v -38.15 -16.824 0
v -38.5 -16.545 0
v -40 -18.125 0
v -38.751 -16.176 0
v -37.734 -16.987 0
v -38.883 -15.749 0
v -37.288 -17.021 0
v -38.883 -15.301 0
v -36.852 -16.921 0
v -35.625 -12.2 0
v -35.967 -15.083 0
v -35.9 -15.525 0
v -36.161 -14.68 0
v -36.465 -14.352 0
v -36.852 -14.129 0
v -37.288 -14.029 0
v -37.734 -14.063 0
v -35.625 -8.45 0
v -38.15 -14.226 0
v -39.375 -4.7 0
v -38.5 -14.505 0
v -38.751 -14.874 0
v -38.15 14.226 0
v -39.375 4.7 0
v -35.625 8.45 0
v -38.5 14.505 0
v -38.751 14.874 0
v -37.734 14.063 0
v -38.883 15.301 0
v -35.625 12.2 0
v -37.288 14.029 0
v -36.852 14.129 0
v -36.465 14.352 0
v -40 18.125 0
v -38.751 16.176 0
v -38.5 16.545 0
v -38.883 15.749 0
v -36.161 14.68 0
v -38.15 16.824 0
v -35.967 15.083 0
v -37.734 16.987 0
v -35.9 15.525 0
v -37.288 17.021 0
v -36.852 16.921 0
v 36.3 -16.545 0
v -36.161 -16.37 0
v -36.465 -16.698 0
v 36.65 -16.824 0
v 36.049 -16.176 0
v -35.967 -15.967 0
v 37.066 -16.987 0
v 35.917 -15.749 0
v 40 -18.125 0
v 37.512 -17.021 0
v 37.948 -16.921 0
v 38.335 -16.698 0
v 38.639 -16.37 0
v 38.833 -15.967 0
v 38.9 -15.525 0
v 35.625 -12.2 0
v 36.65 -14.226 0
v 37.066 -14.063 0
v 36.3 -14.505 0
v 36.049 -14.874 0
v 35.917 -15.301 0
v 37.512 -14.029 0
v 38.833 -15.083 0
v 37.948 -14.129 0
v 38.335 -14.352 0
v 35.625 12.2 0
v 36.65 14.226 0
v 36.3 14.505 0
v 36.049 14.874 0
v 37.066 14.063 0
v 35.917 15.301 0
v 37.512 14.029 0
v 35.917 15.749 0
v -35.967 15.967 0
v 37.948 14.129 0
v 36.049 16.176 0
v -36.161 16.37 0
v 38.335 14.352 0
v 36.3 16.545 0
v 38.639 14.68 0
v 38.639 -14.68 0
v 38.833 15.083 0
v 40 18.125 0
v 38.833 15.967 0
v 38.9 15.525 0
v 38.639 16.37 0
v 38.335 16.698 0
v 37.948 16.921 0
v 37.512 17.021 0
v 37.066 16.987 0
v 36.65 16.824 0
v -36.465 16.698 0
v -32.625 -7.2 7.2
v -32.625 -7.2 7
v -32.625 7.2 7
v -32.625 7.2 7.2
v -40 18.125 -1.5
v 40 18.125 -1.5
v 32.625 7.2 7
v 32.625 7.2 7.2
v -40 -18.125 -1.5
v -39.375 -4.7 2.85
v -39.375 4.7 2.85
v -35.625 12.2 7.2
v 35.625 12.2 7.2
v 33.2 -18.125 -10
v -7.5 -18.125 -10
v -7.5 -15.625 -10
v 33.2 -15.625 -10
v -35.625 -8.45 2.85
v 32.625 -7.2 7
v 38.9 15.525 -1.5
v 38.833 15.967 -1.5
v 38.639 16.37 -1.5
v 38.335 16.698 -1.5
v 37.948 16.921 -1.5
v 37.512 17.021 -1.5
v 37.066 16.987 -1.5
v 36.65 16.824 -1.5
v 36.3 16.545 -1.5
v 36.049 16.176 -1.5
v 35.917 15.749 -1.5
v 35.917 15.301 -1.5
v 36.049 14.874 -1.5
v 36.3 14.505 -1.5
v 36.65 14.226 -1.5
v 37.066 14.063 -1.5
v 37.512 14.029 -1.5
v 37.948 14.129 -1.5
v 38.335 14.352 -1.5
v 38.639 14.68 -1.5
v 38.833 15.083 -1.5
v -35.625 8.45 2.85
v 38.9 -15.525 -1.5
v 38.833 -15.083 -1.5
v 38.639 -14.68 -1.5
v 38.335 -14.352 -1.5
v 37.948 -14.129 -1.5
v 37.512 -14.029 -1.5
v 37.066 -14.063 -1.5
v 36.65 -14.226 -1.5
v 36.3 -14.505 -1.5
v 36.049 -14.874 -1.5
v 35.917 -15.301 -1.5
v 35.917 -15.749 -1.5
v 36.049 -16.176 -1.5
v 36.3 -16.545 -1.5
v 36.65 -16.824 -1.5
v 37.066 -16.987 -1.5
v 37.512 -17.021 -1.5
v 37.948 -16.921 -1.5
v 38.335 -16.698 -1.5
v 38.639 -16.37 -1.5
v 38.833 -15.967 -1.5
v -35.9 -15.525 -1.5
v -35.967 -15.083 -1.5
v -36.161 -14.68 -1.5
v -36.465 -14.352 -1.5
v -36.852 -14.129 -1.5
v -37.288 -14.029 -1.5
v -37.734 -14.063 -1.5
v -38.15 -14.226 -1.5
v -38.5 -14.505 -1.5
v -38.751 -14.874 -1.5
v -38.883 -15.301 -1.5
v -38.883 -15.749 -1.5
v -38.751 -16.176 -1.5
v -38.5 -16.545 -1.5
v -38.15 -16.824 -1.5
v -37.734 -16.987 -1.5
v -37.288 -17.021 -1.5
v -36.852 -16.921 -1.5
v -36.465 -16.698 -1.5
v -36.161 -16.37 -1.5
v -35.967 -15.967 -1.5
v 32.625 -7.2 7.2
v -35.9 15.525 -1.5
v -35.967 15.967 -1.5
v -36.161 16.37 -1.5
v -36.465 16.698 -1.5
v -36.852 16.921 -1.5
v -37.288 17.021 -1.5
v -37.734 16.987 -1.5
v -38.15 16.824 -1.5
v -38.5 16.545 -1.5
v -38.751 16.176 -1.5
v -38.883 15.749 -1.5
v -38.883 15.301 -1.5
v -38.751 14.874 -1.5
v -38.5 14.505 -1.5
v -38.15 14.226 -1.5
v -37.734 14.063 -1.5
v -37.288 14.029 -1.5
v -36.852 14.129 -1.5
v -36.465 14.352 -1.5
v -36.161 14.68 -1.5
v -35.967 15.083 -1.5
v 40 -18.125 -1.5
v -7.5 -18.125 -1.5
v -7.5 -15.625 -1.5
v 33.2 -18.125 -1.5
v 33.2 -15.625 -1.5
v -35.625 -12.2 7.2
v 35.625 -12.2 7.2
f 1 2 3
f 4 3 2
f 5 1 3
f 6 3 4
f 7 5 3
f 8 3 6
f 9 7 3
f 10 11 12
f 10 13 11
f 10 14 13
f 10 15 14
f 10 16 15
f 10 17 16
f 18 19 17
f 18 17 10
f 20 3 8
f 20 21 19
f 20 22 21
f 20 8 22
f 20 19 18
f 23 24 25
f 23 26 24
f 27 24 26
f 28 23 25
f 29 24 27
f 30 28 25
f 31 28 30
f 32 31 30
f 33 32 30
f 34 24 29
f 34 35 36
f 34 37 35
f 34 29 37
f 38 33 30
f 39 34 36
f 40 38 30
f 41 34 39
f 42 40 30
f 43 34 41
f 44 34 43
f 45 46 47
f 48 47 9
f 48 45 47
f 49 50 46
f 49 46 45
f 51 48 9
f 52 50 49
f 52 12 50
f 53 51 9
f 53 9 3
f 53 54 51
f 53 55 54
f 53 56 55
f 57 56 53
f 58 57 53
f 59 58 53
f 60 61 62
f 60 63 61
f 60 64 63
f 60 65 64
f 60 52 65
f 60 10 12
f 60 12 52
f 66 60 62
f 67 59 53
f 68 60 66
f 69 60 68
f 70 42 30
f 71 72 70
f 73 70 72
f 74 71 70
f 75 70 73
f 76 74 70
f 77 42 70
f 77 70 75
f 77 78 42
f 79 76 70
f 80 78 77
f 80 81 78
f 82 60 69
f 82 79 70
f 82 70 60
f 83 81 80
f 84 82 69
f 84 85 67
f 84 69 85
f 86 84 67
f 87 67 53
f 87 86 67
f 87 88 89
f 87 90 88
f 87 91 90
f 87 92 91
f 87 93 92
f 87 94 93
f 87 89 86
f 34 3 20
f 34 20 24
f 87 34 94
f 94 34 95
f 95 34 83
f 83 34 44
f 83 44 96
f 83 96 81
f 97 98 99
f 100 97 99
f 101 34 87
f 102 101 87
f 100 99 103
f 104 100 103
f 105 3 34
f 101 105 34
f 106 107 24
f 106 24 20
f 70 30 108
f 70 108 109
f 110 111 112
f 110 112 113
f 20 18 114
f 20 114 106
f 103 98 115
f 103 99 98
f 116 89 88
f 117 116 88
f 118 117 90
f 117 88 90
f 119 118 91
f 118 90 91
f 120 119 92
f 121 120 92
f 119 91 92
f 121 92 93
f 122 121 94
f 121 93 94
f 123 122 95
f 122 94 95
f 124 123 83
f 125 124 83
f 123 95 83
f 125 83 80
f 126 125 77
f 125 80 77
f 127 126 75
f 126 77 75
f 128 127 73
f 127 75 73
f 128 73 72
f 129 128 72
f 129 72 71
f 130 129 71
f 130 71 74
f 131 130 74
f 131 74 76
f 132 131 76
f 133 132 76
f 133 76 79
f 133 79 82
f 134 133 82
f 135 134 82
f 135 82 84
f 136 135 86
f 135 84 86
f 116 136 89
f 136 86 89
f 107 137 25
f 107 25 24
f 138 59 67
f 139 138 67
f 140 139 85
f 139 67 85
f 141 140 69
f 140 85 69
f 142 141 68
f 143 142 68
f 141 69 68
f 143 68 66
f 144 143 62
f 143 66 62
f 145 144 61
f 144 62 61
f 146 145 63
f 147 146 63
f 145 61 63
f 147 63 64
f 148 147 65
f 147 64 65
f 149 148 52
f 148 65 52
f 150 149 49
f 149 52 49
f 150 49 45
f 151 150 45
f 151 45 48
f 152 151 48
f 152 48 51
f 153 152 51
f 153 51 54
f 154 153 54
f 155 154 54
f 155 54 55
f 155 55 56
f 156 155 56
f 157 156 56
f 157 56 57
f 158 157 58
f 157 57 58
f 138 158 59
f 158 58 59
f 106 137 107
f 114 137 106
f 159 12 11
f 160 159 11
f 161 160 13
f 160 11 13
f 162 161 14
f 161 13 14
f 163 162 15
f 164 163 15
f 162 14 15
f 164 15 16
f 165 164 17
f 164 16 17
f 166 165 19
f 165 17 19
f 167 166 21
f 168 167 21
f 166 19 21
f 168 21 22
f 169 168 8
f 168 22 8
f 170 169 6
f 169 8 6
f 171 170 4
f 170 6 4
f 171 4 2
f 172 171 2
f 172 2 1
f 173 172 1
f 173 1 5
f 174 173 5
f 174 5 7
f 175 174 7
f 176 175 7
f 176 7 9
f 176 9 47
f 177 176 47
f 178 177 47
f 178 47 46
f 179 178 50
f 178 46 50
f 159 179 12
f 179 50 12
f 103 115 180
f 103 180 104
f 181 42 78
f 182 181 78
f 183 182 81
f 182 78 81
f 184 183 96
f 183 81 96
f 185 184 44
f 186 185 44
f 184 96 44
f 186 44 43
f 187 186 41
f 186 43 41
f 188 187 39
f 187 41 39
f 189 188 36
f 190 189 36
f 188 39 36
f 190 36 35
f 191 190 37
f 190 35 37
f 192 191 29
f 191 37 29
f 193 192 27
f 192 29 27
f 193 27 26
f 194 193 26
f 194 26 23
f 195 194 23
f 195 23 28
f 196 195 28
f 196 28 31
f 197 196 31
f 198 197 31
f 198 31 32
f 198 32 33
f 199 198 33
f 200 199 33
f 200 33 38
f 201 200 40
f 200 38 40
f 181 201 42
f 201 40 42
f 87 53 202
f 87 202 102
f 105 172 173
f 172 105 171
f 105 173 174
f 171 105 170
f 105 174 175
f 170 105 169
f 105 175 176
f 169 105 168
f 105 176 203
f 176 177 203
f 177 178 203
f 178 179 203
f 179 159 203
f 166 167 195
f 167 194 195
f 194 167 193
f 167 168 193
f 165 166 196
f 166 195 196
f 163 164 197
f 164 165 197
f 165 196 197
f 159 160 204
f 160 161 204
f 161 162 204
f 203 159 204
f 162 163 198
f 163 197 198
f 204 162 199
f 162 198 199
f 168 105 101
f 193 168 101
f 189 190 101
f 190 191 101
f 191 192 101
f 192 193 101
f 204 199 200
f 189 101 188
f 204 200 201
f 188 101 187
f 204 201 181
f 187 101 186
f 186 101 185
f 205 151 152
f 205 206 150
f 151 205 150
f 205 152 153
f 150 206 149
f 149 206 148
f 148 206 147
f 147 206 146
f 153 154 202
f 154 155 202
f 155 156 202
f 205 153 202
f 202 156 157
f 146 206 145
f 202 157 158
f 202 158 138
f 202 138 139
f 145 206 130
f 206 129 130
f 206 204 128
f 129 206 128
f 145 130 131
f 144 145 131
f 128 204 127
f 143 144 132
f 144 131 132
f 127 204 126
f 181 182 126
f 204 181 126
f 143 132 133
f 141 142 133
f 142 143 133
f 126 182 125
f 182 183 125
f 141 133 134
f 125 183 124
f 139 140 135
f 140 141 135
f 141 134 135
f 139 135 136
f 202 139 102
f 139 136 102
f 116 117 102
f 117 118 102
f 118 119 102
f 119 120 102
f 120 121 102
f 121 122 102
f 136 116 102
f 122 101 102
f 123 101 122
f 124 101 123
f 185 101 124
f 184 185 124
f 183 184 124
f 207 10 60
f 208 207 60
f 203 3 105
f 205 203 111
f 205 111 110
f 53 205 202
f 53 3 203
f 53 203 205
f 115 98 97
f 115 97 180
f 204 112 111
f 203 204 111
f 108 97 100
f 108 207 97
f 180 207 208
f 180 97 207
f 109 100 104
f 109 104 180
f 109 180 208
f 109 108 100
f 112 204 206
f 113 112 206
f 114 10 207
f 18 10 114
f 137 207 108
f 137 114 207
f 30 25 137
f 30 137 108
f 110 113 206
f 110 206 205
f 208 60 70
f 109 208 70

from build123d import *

# Parameters (mm, degrees)
F0_W        = 71.25
F0_H        = 24.4
F0_W_2      = 65.25
F0_H_2      = 14.4
F1_DEPTH    = 7
F2_DEPTH    = 7.2
F3_W        = 17.4
F3_H        = 2.85
F4_DEPTH    = 3.75
F5_T4_DEPTH = 23.4234639037
F5_T9_DEPTH = 23.4234639037
F6_W        = 80
F6_H        = 36.25
F6_R        = 1.5
F7_DEPTH    = 1.5
F8_W        = 40.7
F8_H        = 2.5
F9_DEPTH    = 8.5


# Not quite as in the source:
# - a fillet or chamfer that OpenCascade refuses, or shapes differently, is made with other operations: its cross-section is extruded or revolved along the edge and cut away or added


with BuildPart() as f1:
    # F0 (on Top) → F1 (new body)
    with BuildSketch(Plane.XY):
        Rectangle(F0_W, F0_H)
        Rectangle(F0_W_2, F0_H_2, mode=Mode.SUBTRACT)
        Rectangle(F0_W_2, F0_H_2)
    extrude(amount=F1_DEPTH)

    # F0 (on Top) → F2 (join)
    with BuildSketch(Plane.XY):
        Rectangle(F0_W, F0_H)
        Rectangle(F0_W_2, F0_H_2, mode=Mode.SUBTRACT)
    extrude(amount=F2_DEPTH)

    # F3 (on face) → F4 (join)
    with BuildSketch(Plane(origin=(-35.625, 0, 0), x_dir=(0, -1, 0), z_dir=(-1, 0, 0))):
        with Locations((0, 1.425)):
            Rectangle(F3_W, F3_H)
    extrude(amount=F4_DEPTH)

    # F5: chamfer of 4 on 2 edges, made by hand


with BuildPart() as f5_tool2:
    # F5_s3 → F5_t4 (new body)
    with BuildSketch(Plane.XY.offset(-10.2867319519)):
        Polygon((-35.375, -8.7), (-39.375, -4.7), (-39.375, -8.7), align=None)
    extrude(amount=F5_T4_DEPTH)

    split(bisect_by=Plane.YZ.offset(-35.625), keep=Keep.BOTTOM)


with BuildPart() as f1_1:
    add(f1.part)

    # F5_t1: cut F5_tool2
    add(f5_tool2.part, mode=Mode.SUBTRACT)


with BuildPart() as f5_tool7:
    # F5_s8 → F5_t9 (new body)
    with BuildSketch(Plane.XY.offset(13.1367319519)):
        Polygon((-35.375, 8.7), (-39.375, 4.7), (-39.375, 8.7), align=None)
    extrude(amount=-F5_T9_DEPTH)

    split(bisect_by=Plane.YZ.offset(-35.625), keep=Keep.BOTTOM)


with BuildPart() as f1_2:
    add(f1_1.part)

    # F5_t6: cut F5_tool7
    add(f5_tool7.part, mode=Mode.SUBTRACT)

    # F6 (on Top) → F7 (join)
    with BuildSketch(Plane.XY):
        Rectangle(F6_W, F6_H)
        with Locations((-37.4, -15.525)):
            Circle(F6_R, mode=Mode.SUBTRACT)
        with Locations((37.4, -15.525)):
            Circle(F6_R, mode=Mode.SUBTRACT)
        with Locations((-37.4, 15.525)):
            Circle(F6_R, mode=Mode.SUBTRACT)
        with Locations((37.4, 15.525)):
            Circle(F6_R, mode=Mode.SUBTRACT)
    extrude(amount=-F7_DEPTH)

    # F8 (on face) → F9 (join)
    with BuildSketch(Plane(origin=(0, 0, -1.5), x_dir=(1, 0, 0), z_dir=(0, 0, -1))):
        with Locations((12.85, 16.875)):
            Rectangle(F8_W, F8_H)
    extrude(amount=F9_DEPTH)


solid = f1_2.part
